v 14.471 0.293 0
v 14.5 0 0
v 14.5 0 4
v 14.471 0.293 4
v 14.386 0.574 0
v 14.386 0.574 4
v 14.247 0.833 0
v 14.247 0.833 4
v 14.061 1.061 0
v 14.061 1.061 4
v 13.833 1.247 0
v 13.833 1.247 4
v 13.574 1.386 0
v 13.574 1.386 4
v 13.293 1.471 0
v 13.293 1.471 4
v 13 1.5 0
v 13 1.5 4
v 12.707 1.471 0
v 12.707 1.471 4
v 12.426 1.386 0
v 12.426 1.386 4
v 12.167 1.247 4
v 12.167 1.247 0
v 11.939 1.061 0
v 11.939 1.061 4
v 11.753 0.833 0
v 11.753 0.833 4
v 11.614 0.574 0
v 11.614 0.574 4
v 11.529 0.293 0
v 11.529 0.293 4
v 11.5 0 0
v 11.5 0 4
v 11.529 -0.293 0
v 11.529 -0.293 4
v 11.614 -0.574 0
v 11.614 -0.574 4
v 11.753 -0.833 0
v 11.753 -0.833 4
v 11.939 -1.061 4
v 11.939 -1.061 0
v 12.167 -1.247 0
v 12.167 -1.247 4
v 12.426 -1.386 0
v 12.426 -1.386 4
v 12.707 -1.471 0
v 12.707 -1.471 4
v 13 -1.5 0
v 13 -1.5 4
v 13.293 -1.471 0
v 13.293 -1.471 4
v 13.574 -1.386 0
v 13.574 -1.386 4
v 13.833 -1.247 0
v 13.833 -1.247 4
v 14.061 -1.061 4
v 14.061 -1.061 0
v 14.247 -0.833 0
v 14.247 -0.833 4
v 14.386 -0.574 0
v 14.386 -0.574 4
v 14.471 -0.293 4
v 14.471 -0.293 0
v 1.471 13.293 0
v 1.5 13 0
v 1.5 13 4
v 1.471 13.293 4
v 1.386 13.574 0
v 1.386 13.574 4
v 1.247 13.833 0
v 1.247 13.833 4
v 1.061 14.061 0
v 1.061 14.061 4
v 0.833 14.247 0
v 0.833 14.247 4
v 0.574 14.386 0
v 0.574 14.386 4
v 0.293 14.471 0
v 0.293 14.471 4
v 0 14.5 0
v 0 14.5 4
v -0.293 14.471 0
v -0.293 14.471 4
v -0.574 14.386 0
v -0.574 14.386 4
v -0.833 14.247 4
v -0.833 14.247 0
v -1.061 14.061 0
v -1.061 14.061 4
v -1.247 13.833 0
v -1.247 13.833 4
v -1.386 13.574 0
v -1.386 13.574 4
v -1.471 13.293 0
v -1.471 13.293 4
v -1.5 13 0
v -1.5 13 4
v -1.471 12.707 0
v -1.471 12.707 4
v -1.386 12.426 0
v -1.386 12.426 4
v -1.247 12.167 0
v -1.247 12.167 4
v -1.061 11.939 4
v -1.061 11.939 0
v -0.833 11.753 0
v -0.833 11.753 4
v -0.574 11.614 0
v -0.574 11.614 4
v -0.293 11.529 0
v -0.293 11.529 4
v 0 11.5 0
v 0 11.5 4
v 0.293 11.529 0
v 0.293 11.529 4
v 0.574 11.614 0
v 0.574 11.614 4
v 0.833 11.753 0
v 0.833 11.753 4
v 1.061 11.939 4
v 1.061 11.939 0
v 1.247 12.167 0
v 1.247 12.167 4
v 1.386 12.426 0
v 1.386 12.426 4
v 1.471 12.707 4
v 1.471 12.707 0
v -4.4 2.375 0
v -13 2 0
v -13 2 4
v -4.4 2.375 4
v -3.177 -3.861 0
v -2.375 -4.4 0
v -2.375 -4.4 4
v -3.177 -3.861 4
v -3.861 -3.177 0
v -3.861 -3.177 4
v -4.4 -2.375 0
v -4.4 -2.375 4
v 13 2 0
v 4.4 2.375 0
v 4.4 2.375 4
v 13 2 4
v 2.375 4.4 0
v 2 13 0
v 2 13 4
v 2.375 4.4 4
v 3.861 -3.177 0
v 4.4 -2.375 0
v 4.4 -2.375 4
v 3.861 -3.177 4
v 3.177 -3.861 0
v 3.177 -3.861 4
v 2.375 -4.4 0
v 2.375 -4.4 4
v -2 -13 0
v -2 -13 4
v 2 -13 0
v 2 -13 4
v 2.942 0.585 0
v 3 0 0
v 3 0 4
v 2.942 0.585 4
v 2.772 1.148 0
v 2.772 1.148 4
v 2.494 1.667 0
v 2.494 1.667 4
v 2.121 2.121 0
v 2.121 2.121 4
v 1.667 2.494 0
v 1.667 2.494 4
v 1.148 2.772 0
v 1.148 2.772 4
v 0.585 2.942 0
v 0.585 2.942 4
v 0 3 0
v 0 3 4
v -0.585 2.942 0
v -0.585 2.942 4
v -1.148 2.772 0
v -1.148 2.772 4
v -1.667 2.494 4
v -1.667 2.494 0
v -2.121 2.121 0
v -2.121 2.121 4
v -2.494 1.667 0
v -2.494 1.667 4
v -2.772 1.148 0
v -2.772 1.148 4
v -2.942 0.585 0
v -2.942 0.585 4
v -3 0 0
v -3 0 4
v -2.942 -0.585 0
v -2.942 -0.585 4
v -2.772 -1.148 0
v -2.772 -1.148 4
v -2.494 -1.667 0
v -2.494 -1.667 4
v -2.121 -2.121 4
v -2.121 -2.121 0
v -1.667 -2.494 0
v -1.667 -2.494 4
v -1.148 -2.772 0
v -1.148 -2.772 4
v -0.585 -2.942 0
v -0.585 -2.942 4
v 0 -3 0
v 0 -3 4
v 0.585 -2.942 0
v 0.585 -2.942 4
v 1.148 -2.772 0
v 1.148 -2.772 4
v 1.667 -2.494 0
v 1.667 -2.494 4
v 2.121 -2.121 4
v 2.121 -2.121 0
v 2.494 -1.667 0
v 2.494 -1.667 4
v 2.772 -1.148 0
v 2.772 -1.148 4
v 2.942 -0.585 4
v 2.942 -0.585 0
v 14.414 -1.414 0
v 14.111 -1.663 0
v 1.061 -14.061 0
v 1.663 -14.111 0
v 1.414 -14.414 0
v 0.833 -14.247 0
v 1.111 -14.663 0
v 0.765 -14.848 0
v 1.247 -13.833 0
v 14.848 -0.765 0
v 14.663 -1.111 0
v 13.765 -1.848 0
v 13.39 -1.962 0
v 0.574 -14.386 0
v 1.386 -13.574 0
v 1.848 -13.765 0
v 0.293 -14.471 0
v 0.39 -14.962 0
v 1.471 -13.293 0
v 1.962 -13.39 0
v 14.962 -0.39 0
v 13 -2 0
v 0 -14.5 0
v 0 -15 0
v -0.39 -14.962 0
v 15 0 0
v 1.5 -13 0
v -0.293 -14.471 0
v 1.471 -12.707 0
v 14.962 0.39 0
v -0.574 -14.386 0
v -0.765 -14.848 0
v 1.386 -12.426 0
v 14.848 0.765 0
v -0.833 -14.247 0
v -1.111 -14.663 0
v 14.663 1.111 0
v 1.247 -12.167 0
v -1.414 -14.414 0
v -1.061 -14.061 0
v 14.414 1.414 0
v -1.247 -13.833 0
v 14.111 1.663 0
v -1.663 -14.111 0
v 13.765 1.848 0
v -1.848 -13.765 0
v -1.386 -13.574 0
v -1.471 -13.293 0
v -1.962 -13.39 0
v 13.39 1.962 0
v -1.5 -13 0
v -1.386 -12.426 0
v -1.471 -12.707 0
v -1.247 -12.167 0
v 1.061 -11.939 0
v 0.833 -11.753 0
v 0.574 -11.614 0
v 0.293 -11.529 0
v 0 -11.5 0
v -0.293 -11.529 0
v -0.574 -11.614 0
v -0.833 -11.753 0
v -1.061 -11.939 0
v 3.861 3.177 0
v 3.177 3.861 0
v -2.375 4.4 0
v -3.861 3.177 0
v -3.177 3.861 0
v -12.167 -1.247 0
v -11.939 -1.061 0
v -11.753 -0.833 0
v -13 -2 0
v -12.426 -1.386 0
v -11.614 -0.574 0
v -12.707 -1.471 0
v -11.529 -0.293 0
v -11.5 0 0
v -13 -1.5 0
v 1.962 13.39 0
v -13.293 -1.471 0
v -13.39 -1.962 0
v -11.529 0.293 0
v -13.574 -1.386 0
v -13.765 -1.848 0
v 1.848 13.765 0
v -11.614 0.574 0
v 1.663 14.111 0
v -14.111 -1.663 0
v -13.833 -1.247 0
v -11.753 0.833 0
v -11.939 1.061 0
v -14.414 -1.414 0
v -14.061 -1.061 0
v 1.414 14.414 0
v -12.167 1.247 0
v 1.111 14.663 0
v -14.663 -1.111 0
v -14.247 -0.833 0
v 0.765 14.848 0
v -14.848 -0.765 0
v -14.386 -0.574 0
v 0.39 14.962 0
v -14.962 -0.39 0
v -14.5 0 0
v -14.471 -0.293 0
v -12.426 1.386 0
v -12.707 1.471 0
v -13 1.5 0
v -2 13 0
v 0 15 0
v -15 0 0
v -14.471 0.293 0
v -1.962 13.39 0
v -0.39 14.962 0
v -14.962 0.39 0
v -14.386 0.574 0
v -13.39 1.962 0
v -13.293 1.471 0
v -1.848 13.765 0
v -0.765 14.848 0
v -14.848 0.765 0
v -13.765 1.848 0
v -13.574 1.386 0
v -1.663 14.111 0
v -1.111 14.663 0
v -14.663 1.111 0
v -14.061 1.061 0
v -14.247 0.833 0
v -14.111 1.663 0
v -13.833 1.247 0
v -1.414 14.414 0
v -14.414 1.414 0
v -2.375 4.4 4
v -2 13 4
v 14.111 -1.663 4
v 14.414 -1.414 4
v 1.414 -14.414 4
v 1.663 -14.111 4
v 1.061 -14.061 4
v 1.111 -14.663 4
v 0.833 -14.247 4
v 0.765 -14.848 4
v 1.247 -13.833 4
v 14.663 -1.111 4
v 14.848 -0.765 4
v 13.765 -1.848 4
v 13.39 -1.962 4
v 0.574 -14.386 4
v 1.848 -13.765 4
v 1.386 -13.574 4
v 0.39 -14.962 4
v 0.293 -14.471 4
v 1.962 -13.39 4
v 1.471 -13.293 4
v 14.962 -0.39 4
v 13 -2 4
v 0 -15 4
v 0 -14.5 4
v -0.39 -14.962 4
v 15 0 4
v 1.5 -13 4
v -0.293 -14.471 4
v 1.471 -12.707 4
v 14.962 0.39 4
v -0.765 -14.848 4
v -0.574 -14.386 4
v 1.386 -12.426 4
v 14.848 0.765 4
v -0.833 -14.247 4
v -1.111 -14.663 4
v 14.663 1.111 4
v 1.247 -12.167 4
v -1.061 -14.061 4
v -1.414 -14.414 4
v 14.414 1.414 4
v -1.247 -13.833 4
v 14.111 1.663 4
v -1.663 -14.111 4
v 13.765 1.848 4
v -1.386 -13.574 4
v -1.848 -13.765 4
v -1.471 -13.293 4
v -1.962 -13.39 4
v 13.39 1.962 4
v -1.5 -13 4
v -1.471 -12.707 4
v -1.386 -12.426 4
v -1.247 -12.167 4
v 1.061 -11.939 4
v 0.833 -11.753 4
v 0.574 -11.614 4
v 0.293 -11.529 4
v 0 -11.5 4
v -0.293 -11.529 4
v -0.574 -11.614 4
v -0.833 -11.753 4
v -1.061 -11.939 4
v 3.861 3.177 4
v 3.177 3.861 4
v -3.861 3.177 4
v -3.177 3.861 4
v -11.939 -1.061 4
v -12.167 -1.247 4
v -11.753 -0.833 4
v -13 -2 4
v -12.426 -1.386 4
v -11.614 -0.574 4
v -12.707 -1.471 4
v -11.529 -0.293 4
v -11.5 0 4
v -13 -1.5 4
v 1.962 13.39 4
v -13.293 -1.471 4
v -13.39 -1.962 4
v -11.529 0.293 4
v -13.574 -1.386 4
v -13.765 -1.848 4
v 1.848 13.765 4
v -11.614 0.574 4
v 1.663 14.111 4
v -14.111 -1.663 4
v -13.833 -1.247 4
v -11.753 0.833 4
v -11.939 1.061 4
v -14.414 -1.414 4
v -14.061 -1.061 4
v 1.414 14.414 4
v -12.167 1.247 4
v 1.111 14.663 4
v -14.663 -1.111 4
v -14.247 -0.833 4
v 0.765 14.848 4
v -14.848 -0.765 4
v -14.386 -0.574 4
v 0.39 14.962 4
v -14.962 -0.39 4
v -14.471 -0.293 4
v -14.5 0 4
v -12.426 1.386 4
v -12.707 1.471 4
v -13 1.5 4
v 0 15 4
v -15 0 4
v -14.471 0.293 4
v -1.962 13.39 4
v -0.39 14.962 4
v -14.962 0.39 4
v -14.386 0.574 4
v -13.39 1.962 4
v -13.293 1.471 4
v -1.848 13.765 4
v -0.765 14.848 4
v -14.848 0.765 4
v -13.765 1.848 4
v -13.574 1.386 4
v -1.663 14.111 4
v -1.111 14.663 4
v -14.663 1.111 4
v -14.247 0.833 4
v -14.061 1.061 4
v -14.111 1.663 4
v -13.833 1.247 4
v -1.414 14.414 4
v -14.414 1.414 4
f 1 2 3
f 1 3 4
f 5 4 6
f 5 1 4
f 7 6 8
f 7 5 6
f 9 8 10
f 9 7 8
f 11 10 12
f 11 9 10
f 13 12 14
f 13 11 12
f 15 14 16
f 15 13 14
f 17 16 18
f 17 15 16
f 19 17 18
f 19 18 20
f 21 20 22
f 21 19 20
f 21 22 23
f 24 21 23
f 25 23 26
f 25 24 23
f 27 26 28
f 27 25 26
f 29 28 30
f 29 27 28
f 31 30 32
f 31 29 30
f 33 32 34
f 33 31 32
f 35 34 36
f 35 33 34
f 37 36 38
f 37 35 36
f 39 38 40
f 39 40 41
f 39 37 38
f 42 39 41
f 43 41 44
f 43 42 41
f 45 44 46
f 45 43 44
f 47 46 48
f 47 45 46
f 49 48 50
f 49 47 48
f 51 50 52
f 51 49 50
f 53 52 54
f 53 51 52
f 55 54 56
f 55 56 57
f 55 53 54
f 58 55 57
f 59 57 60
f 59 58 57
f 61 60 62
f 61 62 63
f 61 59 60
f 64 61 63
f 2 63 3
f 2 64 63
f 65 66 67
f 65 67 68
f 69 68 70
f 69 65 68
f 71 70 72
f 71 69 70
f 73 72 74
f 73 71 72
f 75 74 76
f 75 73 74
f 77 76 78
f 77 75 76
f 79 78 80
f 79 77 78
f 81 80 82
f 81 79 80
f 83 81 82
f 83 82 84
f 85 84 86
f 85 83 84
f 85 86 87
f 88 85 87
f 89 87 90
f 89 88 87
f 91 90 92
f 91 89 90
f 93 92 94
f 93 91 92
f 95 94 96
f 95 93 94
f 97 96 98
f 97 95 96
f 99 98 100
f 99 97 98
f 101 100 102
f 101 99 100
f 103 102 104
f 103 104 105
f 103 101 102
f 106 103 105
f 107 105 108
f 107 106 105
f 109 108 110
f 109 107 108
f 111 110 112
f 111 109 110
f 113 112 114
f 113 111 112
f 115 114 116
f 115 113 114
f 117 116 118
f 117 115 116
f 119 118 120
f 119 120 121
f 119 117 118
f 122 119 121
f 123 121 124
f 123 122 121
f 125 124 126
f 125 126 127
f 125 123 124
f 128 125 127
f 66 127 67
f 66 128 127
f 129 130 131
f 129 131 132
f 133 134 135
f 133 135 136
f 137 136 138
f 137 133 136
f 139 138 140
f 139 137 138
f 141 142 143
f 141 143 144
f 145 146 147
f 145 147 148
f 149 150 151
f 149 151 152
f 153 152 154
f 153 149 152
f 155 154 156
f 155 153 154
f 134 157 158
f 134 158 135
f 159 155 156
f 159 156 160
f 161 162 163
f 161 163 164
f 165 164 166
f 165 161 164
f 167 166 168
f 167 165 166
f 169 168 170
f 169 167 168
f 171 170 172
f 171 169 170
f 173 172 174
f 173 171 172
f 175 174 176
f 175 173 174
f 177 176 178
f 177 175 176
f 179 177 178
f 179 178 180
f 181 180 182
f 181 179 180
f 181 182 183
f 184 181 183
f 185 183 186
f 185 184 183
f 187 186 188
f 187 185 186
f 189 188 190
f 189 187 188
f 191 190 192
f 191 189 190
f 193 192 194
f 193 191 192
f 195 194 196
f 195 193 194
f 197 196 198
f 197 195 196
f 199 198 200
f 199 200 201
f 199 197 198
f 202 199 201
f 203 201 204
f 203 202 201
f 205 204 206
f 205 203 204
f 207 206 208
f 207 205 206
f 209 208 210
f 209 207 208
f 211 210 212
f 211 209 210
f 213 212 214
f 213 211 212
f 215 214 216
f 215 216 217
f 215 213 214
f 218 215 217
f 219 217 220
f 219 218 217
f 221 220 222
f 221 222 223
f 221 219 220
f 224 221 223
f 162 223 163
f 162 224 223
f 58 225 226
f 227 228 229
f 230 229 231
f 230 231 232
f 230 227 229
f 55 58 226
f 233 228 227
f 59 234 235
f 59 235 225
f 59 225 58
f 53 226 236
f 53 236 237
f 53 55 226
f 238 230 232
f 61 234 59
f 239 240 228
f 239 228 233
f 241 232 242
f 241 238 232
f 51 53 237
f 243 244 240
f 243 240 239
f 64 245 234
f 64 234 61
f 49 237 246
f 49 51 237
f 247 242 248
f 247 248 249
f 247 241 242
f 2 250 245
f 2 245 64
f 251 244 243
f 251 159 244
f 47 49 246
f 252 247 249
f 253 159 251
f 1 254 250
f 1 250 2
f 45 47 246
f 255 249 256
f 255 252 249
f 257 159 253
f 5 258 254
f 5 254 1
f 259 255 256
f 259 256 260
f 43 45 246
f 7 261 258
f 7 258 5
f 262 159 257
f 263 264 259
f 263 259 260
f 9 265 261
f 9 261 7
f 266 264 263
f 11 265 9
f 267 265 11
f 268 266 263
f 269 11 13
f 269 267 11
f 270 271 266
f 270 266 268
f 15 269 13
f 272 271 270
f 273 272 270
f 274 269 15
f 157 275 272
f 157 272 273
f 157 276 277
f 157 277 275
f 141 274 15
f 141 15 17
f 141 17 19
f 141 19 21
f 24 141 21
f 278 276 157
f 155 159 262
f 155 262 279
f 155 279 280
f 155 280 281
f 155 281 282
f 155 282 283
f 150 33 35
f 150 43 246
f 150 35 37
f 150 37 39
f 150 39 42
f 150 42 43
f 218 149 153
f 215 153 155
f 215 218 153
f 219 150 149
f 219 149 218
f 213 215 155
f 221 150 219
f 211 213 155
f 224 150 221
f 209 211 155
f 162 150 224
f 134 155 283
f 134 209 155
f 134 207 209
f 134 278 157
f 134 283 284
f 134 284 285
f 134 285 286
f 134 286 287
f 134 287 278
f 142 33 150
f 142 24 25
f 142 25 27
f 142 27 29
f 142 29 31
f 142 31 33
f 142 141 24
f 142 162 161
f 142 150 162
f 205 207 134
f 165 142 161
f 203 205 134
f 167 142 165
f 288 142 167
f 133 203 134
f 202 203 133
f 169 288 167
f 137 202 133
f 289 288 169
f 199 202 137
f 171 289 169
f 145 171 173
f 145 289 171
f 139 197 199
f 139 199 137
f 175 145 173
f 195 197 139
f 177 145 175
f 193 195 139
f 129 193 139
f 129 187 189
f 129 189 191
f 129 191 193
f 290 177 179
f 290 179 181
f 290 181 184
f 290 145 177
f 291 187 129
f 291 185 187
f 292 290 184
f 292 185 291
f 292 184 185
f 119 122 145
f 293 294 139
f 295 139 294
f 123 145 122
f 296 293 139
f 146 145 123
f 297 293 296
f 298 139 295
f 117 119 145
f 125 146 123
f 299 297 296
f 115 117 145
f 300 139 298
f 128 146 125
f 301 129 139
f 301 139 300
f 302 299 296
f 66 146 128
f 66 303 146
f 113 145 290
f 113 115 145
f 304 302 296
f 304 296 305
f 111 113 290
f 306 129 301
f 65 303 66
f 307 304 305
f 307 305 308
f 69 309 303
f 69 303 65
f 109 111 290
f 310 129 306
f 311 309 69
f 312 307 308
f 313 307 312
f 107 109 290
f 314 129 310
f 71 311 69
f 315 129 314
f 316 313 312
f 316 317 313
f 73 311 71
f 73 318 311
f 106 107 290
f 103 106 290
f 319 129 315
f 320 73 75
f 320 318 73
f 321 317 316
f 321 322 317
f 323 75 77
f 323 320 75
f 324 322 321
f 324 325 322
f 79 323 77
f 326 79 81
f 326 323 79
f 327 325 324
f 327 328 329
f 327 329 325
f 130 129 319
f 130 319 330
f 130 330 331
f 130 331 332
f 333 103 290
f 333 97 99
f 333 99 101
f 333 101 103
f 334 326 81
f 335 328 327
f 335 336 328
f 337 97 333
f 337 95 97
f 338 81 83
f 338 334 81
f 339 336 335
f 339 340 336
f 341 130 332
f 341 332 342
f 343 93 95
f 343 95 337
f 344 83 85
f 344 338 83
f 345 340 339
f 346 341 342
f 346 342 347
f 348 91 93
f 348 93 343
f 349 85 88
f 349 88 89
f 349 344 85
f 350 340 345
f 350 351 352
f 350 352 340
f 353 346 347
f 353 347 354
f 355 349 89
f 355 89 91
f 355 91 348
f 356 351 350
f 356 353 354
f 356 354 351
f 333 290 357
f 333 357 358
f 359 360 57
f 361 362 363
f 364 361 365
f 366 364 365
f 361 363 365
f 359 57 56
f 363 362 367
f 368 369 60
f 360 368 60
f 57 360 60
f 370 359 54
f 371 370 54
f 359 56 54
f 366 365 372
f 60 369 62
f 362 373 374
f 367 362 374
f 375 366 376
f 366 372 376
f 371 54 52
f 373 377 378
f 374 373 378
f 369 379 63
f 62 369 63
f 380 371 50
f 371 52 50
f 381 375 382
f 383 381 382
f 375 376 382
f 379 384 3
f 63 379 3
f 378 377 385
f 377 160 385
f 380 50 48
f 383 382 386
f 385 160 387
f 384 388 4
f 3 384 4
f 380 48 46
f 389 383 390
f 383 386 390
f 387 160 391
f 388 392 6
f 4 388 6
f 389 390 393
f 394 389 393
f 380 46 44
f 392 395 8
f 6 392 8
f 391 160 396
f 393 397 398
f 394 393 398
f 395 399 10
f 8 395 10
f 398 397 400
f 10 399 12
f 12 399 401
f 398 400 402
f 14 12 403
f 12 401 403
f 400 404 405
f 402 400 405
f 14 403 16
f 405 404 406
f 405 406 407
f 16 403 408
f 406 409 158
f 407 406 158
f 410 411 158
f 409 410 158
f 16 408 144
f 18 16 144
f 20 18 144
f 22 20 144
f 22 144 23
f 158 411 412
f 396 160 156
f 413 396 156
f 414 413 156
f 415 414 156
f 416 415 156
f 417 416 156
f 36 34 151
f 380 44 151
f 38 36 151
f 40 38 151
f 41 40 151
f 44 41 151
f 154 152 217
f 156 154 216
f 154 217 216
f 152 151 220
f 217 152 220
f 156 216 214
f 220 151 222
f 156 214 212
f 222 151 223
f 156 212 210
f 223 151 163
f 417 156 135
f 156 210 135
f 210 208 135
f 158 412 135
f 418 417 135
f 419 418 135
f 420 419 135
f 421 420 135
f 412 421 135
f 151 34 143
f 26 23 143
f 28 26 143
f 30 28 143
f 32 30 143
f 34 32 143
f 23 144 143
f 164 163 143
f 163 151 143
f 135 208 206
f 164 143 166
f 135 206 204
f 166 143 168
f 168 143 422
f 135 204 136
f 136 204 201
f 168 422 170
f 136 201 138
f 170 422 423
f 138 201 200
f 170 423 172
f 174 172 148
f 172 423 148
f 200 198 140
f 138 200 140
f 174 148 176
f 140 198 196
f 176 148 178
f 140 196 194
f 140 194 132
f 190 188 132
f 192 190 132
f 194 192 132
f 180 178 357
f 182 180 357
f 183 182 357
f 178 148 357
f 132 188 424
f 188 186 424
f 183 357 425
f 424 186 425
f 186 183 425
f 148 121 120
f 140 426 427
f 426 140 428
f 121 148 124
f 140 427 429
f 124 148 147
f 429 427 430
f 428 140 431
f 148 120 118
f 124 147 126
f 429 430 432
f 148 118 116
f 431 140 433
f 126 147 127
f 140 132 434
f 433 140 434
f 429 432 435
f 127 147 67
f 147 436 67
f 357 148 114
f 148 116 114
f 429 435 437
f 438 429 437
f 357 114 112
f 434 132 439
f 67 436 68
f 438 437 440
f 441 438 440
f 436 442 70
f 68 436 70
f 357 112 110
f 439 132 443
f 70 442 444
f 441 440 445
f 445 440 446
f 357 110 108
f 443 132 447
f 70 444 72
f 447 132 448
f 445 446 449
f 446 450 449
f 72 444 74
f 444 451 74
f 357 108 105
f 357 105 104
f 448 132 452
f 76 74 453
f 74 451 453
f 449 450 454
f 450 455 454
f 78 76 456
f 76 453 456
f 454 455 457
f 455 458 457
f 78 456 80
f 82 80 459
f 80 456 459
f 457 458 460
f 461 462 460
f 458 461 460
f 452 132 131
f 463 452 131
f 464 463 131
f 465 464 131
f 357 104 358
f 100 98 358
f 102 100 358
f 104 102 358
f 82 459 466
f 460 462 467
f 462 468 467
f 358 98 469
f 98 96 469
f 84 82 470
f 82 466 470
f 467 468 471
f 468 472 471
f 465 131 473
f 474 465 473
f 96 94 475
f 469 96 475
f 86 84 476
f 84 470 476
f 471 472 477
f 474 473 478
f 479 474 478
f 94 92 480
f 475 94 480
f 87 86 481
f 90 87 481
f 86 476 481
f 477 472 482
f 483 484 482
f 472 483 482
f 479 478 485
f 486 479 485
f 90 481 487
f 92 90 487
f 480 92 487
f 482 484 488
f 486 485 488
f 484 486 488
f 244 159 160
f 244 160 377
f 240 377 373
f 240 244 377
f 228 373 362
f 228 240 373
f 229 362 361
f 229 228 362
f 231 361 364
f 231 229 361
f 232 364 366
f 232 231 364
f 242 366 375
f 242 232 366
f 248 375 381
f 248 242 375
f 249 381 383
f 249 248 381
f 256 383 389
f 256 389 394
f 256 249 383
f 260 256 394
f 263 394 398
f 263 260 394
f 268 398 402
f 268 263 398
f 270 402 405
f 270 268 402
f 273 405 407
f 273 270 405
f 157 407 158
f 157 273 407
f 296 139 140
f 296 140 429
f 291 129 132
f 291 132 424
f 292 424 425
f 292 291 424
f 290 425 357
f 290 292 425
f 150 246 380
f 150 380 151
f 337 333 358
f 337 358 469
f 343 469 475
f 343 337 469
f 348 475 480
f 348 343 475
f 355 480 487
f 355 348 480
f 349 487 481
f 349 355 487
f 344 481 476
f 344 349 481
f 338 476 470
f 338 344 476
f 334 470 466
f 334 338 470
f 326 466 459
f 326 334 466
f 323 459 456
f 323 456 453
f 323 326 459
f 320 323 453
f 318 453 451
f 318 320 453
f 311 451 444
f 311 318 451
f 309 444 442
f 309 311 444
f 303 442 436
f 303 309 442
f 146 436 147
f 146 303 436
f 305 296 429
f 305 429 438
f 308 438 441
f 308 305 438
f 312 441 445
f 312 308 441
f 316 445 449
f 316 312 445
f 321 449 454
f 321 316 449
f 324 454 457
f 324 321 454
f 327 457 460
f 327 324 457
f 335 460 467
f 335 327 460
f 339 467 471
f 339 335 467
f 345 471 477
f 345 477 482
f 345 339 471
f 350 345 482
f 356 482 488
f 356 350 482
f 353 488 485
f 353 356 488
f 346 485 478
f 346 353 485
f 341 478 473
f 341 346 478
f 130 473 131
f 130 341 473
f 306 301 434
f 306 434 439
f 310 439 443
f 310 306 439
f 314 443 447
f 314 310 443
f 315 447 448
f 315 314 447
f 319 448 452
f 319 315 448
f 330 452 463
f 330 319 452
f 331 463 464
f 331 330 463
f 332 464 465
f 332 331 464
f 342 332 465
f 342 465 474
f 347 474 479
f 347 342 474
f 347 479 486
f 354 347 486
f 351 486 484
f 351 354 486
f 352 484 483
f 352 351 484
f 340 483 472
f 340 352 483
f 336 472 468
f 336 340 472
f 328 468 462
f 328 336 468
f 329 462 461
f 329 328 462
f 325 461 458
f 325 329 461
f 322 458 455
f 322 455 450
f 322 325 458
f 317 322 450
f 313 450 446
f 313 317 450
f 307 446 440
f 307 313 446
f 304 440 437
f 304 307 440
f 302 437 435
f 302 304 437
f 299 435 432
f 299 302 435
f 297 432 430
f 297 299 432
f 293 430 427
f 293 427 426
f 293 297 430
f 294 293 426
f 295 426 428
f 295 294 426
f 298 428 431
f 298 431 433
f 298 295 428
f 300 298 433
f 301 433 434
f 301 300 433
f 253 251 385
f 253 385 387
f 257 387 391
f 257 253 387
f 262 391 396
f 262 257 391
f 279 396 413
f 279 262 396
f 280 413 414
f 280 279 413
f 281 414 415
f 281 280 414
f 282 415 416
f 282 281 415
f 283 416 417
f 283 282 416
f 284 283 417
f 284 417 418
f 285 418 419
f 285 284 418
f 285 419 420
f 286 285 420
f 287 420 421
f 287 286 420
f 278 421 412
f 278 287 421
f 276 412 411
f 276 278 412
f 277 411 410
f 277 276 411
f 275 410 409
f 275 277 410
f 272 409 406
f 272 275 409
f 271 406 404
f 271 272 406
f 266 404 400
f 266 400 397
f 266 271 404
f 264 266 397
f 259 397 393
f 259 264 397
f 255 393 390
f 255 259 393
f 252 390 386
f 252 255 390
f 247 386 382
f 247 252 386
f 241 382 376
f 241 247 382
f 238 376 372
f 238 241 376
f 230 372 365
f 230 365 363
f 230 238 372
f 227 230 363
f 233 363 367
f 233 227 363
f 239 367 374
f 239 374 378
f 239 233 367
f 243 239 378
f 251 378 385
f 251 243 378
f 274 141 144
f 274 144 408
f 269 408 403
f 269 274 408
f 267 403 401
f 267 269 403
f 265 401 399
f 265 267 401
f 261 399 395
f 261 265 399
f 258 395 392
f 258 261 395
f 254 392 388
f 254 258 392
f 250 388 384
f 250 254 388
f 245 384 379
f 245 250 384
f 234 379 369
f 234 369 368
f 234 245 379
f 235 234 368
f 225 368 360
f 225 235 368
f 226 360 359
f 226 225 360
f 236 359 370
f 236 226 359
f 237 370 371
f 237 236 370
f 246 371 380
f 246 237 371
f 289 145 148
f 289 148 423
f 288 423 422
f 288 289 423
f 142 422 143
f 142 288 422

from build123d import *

# Parameters (mm, degrees)
SKETCH1_R           = 3
SKETCH1_R_2         = 1.5
BOSS_EXTRUDE1_DEPTH = 4


with BuildPart() as part:
    # Sketch1 → Boss-Extrude1 (new body)
    with BuildSketch(Plane.XY):
        with BuildLine():
            Line((2, 13), (2.375498971, 4.399659605))
            ThreePointArc((2.375498971, 4.399659605), (3.535533906, 3.535533906), (4.399659605, 2.375498971))
            Line((4.399659605, 2.375498971), (13, 2))
            ThreePointArc((13, 2), (15, 0), (13, -2))
            Line((13, -2), (4.399659605, -2.375498971))
            ThreePointArc((4.399659605, -2.375498971), (3.535533906, -3.535533906), (2.375498971, -4.399659605))
            Line((2.375498971, -4.399659605), (2, -13))
            ThreePointArc((2, -13), (0, -15), (-2, -13))
            Line((-2, -13), (-2.375498971, -4.399659605))
            ThreePointArc((-2.375498971, -4.399659605), (-3.535533906, -3.535533906), (-4.399659605, -2.375498971))
            Line((-4.399659605, -2.375498971), (-13, -2))
            ThreePointArc((-13, -2), (-15, 0), (-13, 2))
            Line((-13, 2), (-4.399659605, 2.375498971))
            ThreePointArc((-4.399659605, 2.375498971), (-3.535533906, 3.535533906), (-2.375498971, 4.399659605))
            Line((-2.375498971, 4.399659605), (-2, 13))
            ThreePointArc((-2, 13), (0, 15), (2, 13))
        make_face()
        Circle(SKETCH1_R, mode=Mode.SUBTRACT)
        with Locations((0, 13)):
            Circle(SKETCH1_R_2, mode=Mode.SUBTRACT)
        with Locations((13, 0)):
            Circle(SKETCH1_R_2, mode=Mode.SUBTRACT)
        with Locations((0, -13)):
            Circle(SKETCH1_R_2, mode=Mode.SUBTRACT)
        with Locations((-13, 0)):
            Circle(SKETCH1_R_2, mode=Mode.SUBTRACT)
    extrude(amount=BOSS_EXTRUDE1_DEPTH)


solid = part.part
